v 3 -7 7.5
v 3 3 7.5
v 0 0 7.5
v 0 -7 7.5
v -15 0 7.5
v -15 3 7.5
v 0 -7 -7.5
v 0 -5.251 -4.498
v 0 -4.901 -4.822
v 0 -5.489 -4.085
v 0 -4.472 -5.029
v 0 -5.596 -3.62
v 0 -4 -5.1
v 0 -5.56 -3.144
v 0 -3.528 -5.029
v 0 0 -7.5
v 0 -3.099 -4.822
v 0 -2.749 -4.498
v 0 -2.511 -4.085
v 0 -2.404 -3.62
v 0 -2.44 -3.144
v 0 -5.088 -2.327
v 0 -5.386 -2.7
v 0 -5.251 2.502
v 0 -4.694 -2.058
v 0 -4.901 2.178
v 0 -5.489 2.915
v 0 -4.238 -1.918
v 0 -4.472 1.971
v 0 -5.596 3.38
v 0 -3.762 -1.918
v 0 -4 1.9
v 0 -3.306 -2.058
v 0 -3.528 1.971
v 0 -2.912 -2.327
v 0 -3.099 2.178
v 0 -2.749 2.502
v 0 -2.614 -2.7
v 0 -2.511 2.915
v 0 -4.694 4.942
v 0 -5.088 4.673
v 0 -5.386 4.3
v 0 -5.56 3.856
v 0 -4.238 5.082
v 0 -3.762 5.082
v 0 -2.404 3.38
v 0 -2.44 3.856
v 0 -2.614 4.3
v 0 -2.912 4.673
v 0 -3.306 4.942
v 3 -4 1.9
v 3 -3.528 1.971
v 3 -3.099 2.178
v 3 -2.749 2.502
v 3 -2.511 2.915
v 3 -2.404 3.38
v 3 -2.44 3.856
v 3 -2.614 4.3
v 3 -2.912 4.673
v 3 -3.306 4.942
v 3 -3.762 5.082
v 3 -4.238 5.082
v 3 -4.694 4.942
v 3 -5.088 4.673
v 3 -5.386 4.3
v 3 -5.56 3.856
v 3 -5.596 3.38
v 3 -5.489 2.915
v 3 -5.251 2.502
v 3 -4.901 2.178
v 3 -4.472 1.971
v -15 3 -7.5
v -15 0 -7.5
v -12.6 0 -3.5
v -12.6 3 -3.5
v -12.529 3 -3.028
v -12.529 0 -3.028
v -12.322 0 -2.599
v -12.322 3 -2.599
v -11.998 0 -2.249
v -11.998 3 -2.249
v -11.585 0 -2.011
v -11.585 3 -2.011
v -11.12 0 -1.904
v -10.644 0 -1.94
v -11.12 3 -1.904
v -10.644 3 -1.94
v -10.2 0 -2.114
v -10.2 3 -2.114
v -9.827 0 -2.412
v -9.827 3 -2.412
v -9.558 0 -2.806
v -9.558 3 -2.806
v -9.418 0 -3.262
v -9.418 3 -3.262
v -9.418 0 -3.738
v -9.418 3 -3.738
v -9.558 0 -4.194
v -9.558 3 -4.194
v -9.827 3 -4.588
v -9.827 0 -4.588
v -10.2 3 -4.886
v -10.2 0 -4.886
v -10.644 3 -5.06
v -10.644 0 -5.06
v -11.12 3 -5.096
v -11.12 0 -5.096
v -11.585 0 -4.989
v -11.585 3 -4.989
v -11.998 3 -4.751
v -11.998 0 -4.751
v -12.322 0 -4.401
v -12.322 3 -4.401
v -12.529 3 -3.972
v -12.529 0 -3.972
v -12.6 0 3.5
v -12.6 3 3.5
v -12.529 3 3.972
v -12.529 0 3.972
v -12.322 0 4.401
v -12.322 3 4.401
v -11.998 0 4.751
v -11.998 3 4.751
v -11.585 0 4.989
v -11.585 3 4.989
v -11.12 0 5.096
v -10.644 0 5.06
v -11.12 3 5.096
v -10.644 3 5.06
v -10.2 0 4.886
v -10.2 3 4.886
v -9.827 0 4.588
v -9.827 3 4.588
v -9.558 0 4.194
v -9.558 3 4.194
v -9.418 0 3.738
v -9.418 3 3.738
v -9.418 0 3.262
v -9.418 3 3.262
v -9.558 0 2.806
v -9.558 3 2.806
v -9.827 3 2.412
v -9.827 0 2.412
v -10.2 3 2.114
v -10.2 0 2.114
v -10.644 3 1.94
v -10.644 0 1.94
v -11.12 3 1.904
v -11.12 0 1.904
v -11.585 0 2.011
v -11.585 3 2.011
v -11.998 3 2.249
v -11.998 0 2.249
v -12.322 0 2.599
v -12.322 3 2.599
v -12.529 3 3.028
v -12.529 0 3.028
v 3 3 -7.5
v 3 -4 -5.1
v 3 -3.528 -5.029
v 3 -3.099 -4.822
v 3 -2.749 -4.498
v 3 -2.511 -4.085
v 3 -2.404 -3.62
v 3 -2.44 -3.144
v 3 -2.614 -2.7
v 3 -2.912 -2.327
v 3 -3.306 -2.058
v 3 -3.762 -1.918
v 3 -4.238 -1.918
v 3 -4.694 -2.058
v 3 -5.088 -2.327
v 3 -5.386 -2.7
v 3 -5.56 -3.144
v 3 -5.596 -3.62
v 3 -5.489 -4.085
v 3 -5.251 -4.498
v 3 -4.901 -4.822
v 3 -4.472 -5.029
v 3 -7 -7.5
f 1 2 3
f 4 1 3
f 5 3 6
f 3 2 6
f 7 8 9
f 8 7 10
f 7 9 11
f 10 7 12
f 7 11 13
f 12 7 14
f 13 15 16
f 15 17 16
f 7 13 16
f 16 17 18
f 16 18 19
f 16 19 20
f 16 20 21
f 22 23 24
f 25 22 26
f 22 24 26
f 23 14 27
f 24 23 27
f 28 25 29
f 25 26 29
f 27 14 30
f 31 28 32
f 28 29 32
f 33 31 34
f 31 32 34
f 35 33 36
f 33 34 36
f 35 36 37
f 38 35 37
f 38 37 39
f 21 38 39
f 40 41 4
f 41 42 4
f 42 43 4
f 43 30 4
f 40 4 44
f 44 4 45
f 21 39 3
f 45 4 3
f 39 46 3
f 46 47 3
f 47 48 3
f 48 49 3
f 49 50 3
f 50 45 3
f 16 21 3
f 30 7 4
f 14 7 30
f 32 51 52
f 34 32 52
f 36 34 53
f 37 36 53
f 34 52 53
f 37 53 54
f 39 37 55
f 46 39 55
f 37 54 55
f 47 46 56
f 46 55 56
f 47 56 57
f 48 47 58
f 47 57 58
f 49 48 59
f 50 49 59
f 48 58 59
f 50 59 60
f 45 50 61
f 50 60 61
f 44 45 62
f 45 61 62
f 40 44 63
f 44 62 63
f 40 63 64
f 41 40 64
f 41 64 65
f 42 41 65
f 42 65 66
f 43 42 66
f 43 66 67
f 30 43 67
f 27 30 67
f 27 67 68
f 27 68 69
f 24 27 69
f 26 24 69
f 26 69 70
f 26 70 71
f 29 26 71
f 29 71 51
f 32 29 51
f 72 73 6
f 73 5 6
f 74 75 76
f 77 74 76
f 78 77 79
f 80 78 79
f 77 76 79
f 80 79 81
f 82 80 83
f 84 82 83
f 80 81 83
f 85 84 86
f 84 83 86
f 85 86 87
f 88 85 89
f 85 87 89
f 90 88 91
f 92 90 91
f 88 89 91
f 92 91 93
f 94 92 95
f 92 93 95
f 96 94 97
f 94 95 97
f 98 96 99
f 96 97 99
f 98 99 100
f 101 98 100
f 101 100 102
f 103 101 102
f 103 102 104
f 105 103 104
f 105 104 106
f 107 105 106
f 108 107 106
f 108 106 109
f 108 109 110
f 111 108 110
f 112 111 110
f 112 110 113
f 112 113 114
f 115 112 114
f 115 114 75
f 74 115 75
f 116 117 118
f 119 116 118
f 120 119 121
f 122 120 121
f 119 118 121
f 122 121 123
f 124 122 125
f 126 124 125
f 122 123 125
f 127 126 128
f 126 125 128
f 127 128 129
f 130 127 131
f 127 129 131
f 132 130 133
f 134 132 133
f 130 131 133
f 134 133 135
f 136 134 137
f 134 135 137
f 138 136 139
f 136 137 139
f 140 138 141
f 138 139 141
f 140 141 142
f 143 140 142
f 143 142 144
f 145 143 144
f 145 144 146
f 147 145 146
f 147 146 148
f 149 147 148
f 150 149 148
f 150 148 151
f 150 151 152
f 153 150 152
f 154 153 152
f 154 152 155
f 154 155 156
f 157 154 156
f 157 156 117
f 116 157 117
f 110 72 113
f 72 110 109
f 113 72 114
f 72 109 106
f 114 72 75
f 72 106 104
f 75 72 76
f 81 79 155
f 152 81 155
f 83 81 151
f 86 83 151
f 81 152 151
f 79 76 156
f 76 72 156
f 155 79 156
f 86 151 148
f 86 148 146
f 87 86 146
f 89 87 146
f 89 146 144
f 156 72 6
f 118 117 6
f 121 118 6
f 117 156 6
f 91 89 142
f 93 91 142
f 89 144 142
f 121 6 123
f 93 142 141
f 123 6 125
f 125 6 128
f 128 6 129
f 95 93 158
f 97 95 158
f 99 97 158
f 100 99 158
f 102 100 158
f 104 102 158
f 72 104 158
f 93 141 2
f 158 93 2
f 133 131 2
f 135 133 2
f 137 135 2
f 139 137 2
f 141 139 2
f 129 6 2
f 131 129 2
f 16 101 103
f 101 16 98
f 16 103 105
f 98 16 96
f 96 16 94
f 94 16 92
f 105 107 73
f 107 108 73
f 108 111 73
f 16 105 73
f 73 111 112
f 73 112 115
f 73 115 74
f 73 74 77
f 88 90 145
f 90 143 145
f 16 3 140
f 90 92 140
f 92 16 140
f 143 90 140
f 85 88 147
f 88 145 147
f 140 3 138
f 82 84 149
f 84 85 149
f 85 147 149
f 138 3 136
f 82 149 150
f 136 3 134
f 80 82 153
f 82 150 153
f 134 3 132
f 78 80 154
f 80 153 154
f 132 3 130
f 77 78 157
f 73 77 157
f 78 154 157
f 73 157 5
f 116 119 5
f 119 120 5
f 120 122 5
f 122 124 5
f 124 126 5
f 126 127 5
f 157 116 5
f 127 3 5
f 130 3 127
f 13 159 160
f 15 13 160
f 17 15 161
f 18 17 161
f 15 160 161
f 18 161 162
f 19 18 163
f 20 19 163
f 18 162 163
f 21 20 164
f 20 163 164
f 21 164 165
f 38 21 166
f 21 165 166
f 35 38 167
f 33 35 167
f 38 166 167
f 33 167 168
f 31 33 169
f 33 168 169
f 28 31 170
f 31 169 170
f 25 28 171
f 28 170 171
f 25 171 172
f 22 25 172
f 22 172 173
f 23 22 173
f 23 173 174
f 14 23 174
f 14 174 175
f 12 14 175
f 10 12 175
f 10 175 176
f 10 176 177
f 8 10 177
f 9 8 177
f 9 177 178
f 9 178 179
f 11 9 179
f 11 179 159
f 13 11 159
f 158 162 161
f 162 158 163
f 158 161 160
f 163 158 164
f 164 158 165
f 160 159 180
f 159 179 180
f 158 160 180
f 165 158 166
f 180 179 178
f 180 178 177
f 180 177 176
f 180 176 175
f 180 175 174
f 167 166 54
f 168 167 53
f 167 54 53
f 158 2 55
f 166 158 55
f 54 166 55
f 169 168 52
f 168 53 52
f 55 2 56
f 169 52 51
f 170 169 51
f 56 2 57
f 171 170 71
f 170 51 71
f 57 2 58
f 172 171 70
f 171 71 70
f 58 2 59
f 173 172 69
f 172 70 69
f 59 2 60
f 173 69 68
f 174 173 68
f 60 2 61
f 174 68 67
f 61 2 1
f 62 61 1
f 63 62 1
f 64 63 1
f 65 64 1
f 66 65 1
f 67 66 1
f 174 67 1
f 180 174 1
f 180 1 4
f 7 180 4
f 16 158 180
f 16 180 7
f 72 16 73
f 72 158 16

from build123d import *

# Parameters (mm, degrees)
BOSS_EXTRUDE1_DEPTH = 7.5
SKETCH2_R           = 1.6
CUT_EXTRUDE1_DEPTH  = 15
SKETCH3_R           = 1.6
CUT_EXTRUDE2_DEPTH  = 15


with BuildPart() as part:
    # Sketch1 → Boss-Extrude1 (new, symmetric)
    with BuildSketch(Plane.XY):
        Polygon((0, 0), (-15, 0), (-15, 3), (3, 3), (3, -7), (0, -7), align=None)
    extrude(amount=BOSS_EXTRUDE1_DEPTH, both=True)

    # Sketch2 → Cut-Extrude1 (cut)
    with BuildSketch(Plane(origin=(0, 3, 0), x_dir=(1, 0, 0), z_dir=(0, 1, 0))):
        with Locations(Location((-11, 3.5, 0), (0, 0, 180))):
            Circle(SKETCH2_R)
        with Locations(Location((-11, -3.5, 0), (0, 0, 180))):
            Circle(SKETCH2_R)
    extrude(amount=-CUT_EXTRUDE1_DEPTH, mode=Mode.SUBTRACT)

    # Sketch3 → Cut-Extrude2 (cut)
    with BuildSketch(Plane(origin=(3, 0, 0), x_dir=(0, 0, -1), z_dir=(1, 0, 0))):
        with Locations((-3.5, -4)):
            Circle(SKETCH3_R)
        with Locations((3.5, -4)):
            Circle(SKETCH3_R)
    extrude(amount=-CUT_EXTRUDE2_DEPTH, mode=Mode.SUBTRACT)


solid = part.part
